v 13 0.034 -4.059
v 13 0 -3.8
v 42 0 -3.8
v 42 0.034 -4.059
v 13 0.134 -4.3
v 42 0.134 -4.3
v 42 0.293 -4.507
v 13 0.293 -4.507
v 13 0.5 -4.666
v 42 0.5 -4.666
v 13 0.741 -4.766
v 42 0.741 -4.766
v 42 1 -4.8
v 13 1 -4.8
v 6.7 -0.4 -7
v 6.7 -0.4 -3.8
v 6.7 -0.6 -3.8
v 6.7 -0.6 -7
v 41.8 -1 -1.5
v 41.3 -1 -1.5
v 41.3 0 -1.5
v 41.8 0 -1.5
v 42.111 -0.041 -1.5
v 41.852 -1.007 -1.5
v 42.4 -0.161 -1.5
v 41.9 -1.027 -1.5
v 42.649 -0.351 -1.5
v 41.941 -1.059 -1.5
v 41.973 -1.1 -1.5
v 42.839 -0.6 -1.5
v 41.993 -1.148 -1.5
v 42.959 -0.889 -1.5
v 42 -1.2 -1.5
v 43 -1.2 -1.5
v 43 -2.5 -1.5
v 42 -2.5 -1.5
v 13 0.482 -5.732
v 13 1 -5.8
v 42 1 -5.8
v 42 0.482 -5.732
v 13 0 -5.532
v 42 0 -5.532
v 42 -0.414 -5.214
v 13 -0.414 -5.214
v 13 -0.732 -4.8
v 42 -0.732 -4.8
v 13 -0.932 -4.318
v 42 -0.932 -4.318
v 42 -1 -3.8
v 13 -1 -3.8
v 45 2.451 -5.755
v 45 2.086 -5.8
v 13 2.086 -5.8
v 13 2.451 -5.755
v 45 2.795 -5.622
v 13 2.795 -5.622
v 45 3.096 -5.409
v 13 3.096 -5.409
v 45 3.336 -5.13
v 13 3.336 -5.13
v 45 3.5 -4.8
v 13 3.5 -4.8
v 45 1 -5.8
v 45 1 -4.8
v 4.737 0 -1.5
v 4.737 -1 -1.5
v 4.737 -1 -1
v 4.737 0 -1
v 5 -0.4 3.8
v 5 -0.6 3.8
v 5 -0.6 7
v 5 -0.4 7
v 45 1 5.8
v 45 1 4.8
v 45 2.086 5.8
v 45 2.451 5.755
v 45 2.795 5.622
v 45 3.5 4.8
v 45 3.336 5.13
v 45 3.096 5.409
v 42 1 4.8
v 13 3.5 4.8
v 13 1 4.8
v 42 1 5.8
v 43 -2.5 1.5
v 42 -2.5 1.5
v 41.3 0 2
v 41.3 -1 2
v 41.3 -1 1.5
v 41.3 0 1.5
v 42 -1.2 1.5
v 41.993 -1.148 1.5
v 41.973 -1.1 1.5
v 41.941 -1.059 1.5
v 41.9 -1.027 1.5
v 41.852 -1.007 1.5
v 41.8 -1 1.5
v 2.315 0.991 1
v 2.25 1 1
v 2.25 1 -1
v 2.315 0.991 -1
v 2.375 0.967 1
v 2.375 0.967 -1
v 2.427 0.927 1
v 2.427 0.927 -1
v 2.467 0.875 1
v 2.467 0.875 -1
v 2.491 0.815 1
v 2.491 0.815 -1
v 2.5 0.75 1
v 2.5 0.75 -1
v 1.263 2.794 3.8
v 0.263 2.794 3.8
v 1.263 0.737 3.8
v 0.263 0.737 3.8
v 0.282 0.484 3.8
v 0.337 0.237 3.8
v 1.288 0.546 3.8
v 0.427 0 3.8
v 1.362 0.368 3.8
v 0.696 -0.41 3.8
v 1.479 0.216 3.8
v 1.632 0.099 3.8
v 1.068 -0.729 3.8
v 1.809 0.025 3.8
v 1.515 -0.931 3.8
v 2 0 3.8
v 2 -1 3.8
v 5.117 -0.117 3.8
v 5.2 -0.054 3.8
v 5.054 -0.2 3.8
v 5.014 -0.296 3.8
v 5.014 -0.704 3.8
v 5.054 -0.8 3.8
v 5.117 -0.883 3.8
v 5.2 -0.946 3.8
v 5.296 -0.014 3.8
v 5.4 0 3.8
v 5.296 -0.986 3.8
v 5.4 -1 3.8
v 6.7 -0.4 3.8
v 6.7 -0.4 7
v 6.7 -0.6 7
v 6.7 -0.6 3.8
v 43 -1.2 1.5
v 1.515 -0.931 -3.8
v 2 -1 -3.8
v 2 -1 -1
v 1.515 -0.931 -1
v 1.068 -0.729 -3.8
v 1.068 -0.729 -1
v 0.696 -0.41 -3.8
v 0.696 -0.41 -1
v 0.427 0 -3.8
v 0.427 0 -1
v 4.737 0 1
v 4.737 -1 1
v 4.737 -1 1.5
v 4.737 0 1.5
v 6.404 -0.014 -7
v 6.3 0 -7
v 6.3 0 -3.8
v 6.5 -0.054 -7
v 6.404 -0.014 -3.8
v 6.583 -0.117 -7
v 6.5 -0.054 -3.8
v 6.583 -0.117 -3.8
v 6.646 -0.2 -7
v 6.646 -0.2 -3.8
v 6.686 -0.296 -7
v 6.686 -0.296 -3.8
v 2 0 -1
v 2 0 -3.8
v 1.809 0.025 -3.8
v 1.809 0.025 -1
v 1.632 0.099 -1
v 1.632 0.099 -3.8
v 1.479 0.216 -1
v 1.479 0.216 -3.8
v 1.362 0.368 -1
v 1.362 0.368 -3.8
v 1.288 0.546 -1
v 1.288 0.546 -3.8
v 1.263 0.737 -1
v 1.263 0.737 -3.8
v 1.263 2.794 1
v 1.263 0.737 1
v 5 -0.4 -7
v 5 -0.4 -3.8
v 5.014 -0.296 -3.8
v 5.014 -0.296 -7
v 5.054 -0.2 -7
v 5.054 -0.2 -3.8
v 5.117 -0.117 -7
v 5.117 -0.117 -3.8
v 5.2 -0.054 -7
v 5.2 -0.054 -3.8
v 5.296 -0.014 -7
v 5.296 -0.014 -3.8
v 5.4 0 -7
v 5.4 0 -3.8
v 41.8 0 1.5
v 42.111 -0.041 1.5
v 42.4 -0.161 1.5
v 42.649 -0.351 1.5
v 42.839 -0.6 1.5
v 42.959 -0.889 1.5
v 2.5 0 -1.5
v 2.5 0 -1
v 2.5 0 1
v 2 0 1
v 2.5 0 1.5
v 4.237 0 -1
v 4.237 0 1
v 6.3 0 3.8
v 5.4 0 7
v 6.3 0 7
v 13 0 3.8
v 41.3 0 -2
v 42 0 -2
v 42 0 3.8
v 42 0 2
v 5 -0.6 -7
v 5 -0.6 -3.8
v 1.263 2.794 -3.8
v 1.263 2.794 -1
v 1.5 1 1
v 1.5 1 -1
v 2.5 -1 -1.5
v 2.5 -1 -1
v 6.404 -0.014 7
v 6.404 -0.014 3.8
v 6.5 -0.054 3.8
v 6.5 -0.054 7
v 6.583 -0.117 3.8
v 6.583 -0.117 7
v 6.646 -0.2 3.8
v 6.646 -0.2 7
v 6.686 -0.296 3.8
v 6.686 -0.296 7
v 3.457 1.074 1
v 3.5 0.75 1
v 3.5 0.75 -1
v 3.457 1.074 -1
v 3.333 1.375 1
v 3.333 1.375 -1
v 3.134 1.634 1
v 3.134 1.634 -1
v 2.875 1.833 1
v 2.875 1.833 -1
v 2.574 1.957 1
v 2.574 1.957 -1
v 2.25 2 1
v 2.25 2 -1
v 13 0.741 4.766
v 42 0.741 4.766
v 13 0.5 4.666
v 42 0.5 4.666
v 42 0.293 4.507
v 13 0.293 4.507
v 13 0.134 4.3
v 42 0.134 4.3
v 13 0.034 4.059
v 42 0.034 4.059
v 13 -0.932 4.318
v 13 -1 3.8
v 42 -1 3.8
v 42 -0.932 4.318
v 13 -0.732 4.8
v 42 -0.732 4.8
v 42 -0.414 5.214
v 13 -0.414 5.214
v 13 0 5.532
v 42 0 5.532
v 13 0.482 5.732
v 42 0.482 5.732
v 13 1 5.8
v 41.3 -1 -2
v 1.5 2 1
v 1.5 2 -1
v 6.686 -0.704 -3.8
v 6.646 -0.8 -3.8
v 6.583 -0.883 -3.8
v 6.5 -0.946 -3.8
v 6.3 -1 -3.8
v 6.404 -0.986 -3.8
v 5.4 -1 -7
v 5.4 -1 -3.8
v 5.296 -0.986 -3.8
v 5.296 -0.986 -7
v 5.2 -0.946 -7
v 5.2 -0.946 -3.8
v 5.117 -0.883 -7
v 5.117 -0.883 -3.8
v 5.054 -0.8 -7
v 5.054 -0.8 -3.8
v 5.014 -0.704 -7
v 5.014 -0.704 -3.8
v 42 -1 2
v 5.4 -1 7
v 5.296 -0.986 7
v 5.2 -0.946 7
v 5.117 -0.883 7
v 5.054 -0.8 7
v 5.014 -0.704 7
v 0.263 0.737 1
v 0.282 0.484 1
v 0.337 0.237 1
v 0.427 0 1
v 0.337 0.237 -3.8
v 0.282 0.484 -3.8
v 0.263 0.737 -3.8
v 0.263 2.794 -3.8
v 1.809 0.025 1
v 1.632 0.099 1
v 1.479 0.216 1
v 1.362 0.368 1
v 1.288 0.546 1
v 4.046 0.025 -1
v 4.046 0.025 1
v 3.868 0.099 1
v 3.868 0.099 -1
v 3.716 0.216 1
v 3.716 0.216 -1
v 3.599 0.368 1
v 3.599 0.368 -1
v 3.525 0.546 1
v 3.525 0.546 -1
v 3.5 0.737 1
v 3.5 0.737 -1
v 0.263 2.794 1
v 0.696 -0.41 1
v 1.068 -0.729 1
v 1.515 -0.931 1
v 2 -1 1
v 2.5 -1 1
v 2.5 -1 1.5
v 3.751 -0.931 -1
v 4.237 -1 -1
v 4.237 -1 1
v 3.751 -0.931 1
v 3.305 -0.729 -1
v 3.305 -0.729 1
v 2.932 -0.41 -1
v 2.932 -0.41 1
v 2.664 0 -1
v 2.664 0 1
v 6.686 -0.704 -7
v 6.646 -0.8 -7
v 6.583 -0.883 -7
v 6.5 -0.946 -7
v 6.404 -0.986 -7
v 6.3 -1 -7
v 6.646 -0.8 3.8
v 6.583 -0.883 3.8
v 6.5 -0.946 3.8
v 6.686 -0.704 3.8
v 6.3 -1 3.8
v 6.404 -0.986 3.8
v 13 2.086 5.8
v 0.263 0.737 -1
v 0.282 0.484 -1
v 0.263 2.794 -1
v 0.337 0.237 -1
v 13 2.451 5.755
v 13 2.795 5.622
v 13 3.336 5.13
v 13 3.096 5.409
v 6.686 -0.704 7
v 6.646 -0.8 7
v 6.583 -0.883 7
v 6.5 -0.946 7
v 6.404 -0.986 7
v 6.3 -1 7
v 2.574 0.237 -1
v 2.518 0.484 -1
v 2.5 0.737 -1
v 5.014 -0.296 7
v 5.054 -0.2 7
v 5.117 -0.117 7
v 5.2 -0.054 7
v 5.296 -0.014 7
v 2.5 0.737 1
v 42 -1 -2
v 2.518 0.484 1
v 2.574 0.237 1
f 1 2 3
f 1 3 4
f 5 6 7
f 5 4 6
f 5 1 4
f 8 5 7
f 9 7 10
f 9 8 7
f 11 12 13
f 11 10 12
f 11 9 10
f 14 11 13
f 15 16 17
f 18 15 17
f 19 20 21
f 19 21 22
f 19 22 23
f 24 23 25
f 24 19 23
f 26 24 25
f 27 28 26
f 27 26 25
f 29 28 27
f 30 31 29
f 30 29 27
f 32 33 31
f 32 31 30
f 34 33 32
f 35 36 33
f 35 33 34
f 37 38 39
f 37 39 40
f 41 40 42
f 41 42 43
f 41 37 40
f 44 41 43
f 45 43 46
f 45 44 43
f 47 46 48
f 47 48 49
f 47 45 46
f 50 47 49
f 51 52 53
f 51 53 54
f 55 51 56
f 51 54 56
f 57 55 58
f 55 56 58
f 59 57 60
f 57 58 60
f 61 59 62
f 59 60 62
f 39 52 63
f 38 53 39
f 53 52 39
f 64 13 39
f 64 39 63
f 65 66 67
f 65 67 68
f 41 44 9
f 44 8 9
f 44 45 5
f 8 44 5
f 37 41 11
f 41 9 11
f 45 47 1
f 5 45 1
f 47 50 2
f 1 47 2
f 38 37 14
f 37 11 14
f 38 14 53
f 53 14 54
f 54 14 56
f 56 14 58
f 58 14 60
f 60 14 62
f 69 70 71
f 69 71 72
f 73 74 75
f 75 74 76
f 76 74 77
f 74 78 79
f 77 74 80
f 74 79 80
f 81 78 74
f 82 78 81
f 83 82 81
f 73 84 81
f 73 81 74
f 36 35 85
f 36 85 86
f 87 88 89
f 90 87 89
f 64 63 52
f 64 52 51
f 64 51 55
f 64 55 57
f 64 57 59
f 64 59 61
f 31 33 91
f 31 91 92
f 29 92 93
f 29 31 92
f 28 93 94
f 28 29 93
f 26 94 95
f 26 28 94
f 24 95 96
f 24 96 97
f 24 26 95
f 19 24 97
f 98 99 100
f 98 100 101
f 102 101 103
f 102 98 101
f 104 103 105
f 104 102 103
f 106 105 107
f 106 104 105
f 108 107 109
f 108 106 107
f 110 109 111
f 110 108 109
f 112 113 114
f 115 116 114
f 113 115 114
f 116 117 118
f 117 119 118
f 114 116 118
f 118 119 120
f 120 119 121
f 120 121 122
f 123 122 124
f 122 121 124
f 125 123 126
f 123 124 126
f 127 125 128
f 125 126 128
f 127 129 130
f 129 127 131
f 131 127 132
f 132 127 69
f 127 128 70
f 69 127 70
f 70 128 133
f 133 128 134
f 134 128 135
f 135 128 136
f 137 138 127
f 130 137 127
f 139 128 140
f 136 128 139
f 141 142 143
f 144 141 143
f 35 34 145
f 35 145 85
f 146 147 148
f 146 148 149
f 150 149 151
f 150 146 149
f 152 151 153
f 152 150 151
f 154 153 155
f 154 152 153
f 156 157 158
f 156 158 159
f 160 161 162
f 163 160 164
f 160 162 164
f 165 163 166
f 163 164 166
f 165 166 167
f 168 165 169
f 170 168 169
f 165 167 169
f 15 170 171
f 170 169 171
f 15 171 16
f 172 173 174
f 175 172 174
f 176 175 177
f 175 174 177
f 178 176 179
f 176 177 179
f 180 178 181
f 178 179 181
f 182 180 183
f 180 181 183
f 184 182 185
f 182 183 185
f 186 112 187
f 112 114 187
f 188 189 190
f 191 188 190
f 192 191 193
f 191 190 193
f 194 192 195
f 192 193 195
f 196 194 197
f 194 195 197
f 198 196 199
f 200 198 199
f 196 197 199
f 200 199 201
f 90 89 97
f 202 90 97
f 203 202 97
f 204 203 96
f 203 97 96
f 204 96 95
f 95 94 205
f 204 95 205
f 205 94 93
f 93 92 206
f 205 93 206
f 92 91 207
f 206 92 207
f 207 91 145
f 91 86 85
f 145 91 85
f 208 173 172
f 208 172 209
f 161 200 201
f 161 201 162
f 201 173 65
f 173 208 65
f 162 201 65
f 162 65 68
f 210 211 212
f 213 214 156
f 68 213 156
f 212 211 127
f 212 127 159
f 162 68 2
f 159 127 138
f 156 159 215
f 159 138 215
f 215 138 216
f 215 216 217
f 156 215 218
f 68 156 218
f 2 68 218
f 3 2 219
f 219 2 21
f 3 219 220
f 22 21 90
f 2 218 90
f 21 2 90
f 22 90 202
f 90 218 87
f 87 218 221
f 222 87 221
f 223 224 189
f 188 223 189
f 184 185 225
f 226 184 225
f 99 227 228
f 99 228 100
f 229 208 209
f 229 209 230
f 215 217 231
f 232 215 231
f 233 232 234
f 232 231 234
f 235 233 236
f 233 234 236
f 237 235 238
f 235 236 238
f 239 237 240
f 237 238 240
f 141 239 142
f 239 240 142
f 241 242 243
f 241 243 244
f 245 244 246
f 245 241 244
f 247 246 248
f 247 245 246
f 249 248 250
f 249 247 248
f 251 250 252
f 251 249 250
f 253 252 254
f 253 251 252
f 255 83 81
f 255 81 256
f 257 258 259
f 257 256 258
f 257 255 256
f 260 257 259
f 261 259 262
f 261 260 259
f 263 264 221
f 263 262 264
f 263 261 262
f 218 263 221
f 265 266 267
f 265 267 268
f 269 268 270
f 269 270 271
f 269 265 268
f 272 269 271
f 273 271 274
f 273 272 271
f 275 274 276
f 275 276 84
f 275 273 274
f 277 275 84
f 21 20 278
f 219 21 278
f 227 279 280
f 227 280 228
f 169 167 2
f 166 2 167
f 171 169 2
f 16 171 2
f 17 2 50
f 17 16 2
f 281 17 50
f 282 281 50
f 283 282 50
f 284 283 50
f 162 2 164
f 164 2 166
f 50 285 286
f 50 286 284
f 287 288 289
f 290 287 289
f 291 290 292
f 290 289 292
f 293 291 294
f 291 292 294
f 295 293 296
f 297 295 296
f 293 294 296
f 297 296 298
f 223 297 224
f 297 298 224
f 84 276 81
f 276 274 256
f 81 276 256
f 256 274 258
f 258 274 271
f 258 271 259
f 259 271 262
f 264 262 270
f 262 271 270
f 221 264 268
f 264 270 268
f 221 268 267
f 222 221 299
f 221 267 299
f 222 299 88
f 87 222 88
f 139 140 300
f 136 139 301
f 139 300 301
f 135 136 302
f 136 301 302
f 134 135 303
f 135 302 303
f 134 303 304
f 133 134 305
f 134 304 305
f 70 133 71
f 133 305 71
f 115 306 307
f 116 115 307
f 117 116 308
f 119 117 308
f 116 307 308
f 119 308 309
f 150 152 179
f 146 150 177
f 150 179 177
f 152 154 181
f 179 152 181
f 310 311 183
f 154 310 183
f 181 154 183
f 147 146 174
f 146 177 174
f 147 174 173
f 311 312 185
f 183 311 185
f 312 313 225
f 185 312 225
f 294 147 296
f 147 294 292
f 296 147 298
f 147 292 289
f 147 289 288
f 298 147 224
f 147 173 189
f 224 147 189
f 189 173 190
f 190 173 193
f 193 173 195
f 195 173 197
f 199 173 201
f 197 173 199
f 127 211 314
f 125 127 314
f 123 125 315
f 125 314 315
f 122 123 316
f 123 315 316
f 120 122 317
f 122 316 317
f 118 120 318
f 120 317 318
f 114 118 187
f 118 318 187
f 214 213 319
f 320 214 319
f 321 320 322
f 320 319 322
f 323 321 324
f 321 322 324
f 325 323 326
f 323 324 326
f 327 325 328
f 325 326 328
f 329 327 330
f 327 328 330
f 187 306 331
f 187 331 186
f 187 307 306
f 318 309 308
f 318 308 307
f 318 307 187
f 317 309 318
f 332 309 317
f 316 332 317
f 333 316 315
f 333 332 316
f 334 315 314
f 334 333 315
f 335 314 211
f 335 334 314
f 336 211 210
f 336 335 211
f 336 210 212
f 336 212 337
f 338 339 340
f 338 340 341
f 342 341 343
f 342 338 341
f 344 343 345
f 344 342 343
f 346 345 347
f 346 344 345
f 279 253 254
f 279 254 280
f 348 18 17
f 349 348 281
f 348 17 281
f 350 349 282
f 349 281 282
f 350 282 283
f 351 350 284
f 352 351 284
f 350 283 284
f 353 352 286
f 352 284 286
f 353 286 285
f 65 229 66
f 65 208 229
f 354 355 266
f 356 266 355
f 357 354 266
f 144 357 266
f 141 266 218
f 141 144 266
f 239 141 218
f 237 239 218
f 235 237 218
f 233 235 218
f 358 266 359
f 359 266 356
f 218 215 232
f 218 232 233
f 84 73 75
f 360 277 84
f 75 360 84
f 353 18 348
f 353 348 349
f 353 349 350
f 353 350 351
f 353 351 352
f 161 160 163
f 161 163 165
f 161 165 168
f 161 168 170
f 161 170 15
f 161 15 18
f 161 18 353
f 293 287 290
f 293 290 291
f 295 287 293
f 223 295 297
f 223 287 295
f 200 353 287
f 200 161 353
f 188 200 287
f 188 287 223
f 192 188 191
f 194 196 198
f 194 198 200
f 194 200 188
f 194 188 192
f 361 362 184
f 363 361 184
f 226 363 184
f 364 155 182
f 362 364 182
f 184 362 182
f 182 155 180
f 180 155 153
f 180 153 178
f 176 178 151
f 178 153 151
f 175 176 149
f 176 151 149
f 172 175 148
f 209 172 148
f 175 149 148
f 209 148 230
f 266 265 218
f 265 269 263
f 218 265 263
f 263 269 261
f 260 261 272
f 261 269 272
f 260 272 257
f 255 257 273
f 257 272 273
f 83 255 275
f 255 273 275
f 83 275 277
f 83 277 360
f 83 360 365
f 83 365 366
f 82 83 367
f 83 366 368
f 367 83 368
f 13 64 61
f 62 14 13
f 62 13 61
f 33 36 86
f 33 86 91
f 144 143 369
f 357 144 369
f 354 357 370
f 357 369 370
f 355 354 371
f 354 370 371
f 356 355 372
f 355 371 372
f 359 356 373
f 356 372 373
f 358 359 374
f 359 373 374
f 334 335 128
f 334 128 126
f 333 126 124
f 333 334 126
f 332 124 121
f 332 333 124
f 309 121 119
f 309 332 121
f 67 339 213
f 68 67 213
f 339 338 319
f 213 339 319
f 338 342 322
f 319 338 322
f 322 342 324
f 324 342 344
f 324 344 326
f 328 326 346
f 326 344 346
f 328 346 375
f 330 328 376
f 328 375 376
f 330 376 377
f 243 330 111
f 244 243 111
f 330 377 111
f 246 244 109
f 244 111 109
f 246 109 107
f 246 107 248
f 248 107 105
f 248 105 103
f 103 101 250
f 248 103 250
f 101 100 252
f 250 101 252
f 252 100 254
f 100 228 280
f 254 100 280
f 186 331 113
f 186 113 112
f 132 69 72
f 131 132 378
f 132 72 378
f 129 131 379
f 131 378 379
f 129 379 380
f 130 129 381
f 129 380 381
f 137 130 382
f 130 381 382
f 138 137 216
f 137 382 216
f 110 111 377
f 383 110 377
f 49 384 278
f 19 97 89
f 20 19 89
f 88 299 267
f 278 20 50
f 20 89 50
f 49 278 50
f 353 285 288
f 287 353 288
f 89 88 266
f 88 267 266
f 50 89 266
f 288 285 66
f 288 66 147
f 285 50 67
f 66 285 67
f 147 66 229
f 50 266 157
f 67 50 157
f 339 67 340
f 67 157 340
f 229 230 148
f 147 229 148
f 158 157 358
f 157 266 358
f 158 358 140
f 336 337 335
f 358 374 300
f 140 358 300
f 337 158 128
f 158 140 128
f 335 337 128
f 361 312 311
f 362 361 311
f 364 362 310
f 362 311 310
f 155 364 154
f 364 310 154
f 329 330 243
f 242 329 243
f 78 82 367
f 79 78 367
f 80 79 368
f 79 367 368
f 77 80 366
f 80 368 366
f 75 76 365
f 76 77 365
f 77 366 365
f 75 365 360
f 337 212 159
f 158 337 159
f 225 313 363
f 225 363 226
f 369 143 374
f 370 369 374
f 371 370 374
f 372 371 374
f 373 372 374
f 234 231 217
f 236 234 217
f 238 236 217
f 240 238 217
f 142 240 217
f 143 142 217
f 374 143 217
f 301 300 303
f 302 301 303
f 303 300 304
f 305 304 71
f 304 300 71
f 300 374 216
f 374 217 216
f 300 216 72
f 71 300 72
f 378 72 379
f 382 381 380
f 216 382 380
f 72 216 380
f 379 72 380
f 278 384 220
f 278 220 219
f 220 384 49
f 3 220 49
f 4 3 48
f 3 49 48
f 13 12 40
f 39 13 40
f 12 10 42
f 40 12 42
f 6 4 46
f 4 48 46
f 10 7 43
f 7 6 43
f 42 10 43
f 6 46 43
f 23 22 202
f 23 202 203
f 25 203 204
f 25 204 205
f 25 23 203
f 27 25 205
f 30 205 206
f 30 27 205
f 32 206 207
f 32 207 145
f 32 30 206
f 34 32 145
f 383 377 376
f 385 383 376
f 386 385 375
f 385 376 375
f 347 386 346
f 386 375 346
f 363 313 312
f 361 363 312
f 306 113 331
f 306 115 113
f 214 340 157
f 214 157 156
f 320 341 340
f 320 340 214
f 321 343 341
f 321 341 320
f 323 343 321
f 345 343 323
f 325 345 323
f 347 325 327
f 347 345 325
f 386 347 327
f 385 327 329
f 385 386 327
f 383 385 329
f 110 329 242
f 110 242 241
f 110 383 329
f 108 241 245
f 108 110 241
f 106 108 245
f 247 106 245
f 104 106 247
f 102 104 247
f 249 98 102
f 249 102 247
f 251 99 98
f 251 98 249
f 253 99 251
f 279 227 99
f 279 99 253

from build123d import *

# Parameters (mm, degrees)
BASE_FLANGE2_DEPTH              = 45
FRONT_CUT_DEPTH                 = 2
FRONT_STRIP_W                   = 4.4
FRONT_STRIP_H                   = 1
FRONT_STRIP_CUT_DEPTH           = 3
FRONT_RELIEF_W                  = 4.9
FRONT_RELIEF_H                  = 0.5
FRONT_RELIEF_CUT_DEPTH          = 1
FRONT_DEPTH                     = 3
BACK_CUT_DEPTH                  = 13
GUIDING_PINS_DEPTH              = 7
FILLET3_R                       = 1.5
BACK_START                      = -3.8
BACK_2_BENDS_DEPTH              = 7.6
BACK_2_BENDS_2_DEPTH            = 7.6
MIDDLE_CUT_DEPTH                = 46.675485766
MIDDLE_CUT_DEPTH_BACK           = 46.675485766
SKETCH32_W                      = 2.5
SKETCH32_H                      = 2
MIDDLE_START                    = -1.5
MIDDLE_SPRING_1_DEPTH           = 3
MIDDLE_SPRING_1_2_DEPTH         = 0.5
MIDDLE_START_2                  = 1
MIDDLE_SPRING_1_3_DEPTH         = 0.5
MIDDLE_START_3                  = -1
MIDDLE_SPRING_1_4_DEPTH         = 2
MIDDLE_SPRING_2_STRIP_W         = 4.5
MIDDLE_SPRING_2_STRIP_H         = 1
MIDDLE_SPRING_2_STRIP_CUT_DEPTH = 2
MIDDLE_SPRING_2_DEPTH           = 2
SKETCH50_W                      = 1
SKETCH50_H                      = 2.8
BACK_2_BENDS_EXTENSION_DEPTH    = 2


# Read off the part's stored shape, not the designer's step: back cut, back 2 bends, middle spring 1
# Sheet-metal steps are written as plain solids
with BuildPart() as part:
    # Sketch6 → Base-Flange2 (new body)
    with BuildSketch(Plane(origin=(0, 0, 0), x_dir=(0, 0, -1), z_dir=(1, 0, 0))):
        with BuildLine():
            Line((-4.8, 3.5), (-4.8, 1))
            ThreePointArc((-4.8, 1), (-4.507106781, 0.292893219), (-3.8, 0))
            Line((-3.8, 0), (3.8, 0))
            ThreePointArc((3.8, 0), (4.507106781, 0.292893219), (4.8, 1))
            Line((4.8, 1), (4.8, 3.5))
            Line((4.8, 3.5), (5.8, 3.5))
            Line((5.8, 3.5), (5.8, 1))
            ThreePointArc((5.8, 1), (5.214213562, -0.414213562), (3.8, -1))
            Line((3.8, -1), (-3.8, -1))
            ThreePointArc((-3.8, -1), (-5.214213562, -0.414213562), (-5.8, 1))
            Line((-5.8, 1), (-5.8, 3.5))
            Line((-5.8, 3.5), (-4.8, 3.5))
        make_face()
    extrude(amount=BASE_FLANGE2_DEPTH)

    # Sketch51 → front cut (cut)
    with BuildSketch(Plane.XZ.offset(1)):
        Polygon((42, 1.5), (43, 1.5), (43, -1.5), (42, -1.5), (42, -6), (46, -6), (46, -1.5), (45, -1.5), (45, 1.5), (46, 1.5), (46, 6), (42, 6), align=None)
    extrude(amount=-FRONT_CUT_DEPTH, mode=Mode.SUBTRACT)

    # front strip (across the edge) → front strip cut (cut)
    with BuildSketch(Plane(origin=(43, -1, -1.5), x_dir=(-1, 0, 0), z_dir=(0, 0, 1))):
        with Locations((-1, -0.5)):
            Rectangle(FRONT_STRIP_W, FRONT_STRIP_H)
    extrude(amount=FRONT_STRIP_CUT_DEPTH, mode=Mode.SUBTRACT)

    # front relief (on the sheet) → front relief cut (cut)
    with BuildSketch(Plane(origin=(41.8, -1, -1.5), x_dir=(-1, 0, 0), z_dir=(0, -1, 0))):
        with Locations((-1.95, 0.25)):
            Rectangle(FRONT_RELIEF_W, FRONT_RELIEF_H)
        with Locations((-1.95, -3.25)):
            Rectangle(FRONT_RELIEF_W, FRONT_RELIEF_H)
    extrude(amount=-FRONT_RELIEF_CUT_DEPTH, mode=Mode.SUBTRACT)

    # front section (across the edge) → front (add)
    with BuildSketch(Plane(origin=(43, -1, -1.5), x_dir=(-1, 0, 0), z_dir=(0, 0, 1))):
        with BuildLine():
            Line((0, 0.2), (0, 1.5))
            Line((0, 1.5), (1, 1.5))
            Line((1, 1.5), (1, 0.2))
            ThreePointArc((1, 0.2), (1.058578644, 0.058578644), (1.2, 0))
            Line((1.2, 0), (1.2, -1))
            ThreePointArc((1.2, -1), (0.351471863, -0.648528137), (0, 0.2))
        make_face()
    extrude(amount=FRONT_DEPTH)

    # back cut outline → back cut (cut)
    with BuildSketch(Plane.YZ):
        with BuildLine():
            Line((-1, 3.8), (0, 3.8))
            ThreePointArc((0, 3.8), (0.292893219, 4.507106781), (1, 4.8))
            Line((1, 4.8), (3.5, 4.8))
            Line((3.5, 4.8), (3.5, 5.8))
            Line((3.5, 5.8), (1, 5.8))
            ThreePointArc((1, 5.8), (-0.414213562, 5.214213562), (-1, 3.8))
        make_face()
        with BuildLine():
            ThreePointArc((1, -4.8), (0.292893219, -4.507106781), (0, -3.8))
            Line((0, -3.8), (-1, -3.8))
            ThreePointArc((-1, -3.8), (-0.414213562, -5.214213562), (1, -5.8))
            Line((1, -5.8), (3.5, -5.8))
            Line((3.5, -5.8), (3.5, -4.8))
            Line((3.5, -4.8), (1, -4.8))
        make_face()
    extrude(amount=BACK_CUT_DEPTH, mode=Mode.SUBTRACT)

    # Sketch27 → guiding pins (add, symmetric)
    with BuildSketch(Plane.XY):
        with BuildLine():
            Line((5.4, 0), (6.3, 0))
            ThreePointArc((6.3, 0), (6.582842712, -0.117157288), (6.7, -0.4))
            Line((6.7, -0.4), (6.7, -0.6))
            ThreePointArc((6.7, -0.6), (6.582842712, -0.882842712), (6.3, -1))
            Line((6.3, -1), (5.4, -1))
            ThreePointArc((5.4, -1), (5.117157288, -0.882842712), (5, -0.6))
            Line((5, -0.6), (5, -0.4))
            ThreePointArc((5, -0.4), (5.117157288, -0.117157288), (5.4, 0))
        make_face()
    extrude(amount=GUIDING_PINS_DEPTH, both=True)

    # Fillet3
    # the kernel refuses this fillet: 1.5 mm, written as the material it takes off along each edge
    with BuildSketch(Plane(origin=(9.464466094, 3.5, 5.8), x_dir=(0, -1, 0), z_dir=(1, 0, 0))) as fillet3_piece_1:
        with BuildLine():
            CenterArc((1.414213562, 1.5), FILLET3_R, 199.471220634, 70.528779366)
            Line((0, 1), (-0.028284271, 0.99))
            ThreePointArc((-0.028284271, 0.99), (-0.03, 0.5), (-0.03, 0))
            Line((-0.03, 0), (0, -0.03))
            Line((0, -0.03), (1.414213562, -0.03))
            Line((1.414213562, -0.03), (1.414213562, 0))
        make_face()
    extrude(amount=39.071067812, mode=Mode.SUBTRACT)
    with BuildSketch(Plane(origin=(9.464466094, 3.5, -5.8), x_dir=(0, -1, 0), z_dir=(1, 0, 0))) as fillet3_piece_2:
        with BuildLine():
            CenterArc((1.414213562, -1.5), FILLET3_R, 90, 70.528779366)
            Line((0, -1), (-0.028284271, -0.99))
            ThreePointArc((-0.028284271, -0.99), (-0.03, -0.5), (-0.03, 0))
            Line((-0.03, 0), (0, 0.03))
            Line((0, 0.03), (1.414213562, 0.03))
            Line((1.414213562, 0.03), (1.414213562, 0))
        make_face()
    extrude(amount=39.071067812, mode=Mode.SUBTRACT)

    # back 2 bends outline → back 2 bends (cut)
    with BuildSketch(Plane.XY.offset(BACK_START)):
        with BuildLine():
            Line((0, -1), (2, -1))
            ThreePointArc((2, -1), (1.068173836, -0.728828115), (0.42735891, 0))
            Line((0.42735891, 0), (0, 0))
            Line((0, 0), (0, -1))
        make_face()
    extrude(amount=BACK_2_BENDS_DEPTH, mode=Mode.SUBTRACT)

    # back 2 bends 2 outline → back 2 bends 2 (add)
    with BuildSketch(Plane.XY.offset(BACK_START)):
        with BuildLine():
            ThreePointArc((0.2634, 0.7366), (0.304885243, 0.359286442), (0.42735891, 0))
            Line((0.42735891, 0), (2, 0))
            ThreePointArc((2, 0), (1.479145145, 0.215745145), (1.2634, 0.7366))
            Line((1.2634, 0.7366), (1.2634, 0.794153262))
            Line((1.2634, 0.794153262), (0.2634, 0.794153262))
            Line((0.2634, 0.794153262), (0.2634, 0.7366))
        make_face()
    extrude(amount=BACK_2_BENDS_2_DEPTH)

    # Sketch32 → middle cut (cut, two sides: drawn at the far end of the back side and taken through both)
    with BuildSketch(Plane(origin=(0, 0, 0), x_dir=(1, 0, 0), z_dir=(0, 1, 0)).offset(-MIDDLE_CUT_DEPTH_BACK)):
        with Locations((1.25, 0)):
            Rectangle(SKETCH32_W, SKETCH32_H)
    extrude(amount=MIDDLE_CUT_DEPTH + MIDDLE_CUT_DEPTH_BACK, mode=Mode.SUBTRACT)

    # middle spring 1 outline → middle spring 1 (cut)
    with BuildSketch(Plane.XY.offset(MIDDLE_START)):
        with BuildLine():
            Line((2.5, 0), (2.5, -1))
            Line((2.5, -1), (4.2366, -1))
            ThreePointArc((4.2366, -1), (3.304773836, -0.728828115), (2.66395891, 0))
            Line((2.66395891, 0), (2.5, 0))
        make_face()
    extrude(amount=MIDDLE_SPRING_1_DEPTH, mode=Mode.SUBTRACT)

    # middle spring 1 2 outline → middle spring 1 2 (cut)
    with BuildSketch(Plane.XY.offset(MIDDLE_START)):
        with BuildLine():
            ThreePointArc((2.66395891, 0), (3.304773836, -0.728828115), (4.2366, -1))
            Line((4.2366, -1), (4.7366, -1))
            Line((4.7366, -1), (4.7366, 0))
            Line((4.7366, 0), (2.66395891, 0))
        make_face()
    extrude(amount=MIDDLE_SPRING_1_2_DEPTH, mode=Mode.SUBTRACT)

    # middle spring 1 3 outline → middle spring 1 3 (cut)
    with BuildSketch(Plane.XY.offset(MIDDLE_START_2)):
        with BuildLine():
            ThreePointArc((2.66395891, 0), (3.304773836, -0.728828115), (4.2366, -1))
            Line((4.2366, -1), (4.7366, -1))
            Line((4.7366, -1), (4.7366, 0))
            Line((4.7366, 0), (2.66395891, 0))
        make_face()
    extrude(amount=MIDDLE_SPRING_1_3_DEPTH, mode=Mode.SUBTRACT)

    # middle spring 1 4 outline → middle spring 1 4 (add)
    with BuildSketch(Plane.XY.offset(MIDDLE_START_3)):
        with BuildLine():
            ThreePointArc((2.5, 0.7366), (2.541485243, 0.359286442), (2.66395891, 0))
            Line((2.66395891, 0), (4.2366, 0))
            ThreePointArc((4.2366, 0), (3.715745145, 0.215745145), (3.5, 0.7366))
            Line((3.5, 0.7366), (3.5, 2))
            Line((3.5, 2), (2.5, 2))
            Line((2.5, 2), (2.5, 0.7366))
        make_face()
    extrude(amount=MIDDLE_SPRING_1_4_DEPTH)

    # middle spring 2 strip (across the edge) → middle spring 2 strip cut (cut)
    with BuildSketch(Plane(origin=(2.5, 2, 1), x_dir=(0, -1, 0), z_dir=(0, 0, -1))):
        with Locations((-1, -0.5)):
            Rectangle(MIDDLE_SPRING_2_STRIP_W, MIDDLE_SPRING_2_STRIP_H)
    extrude(amount=MIDDLE_SPRING_2_STRIP_CUT_DEPTH, mode=Mode.SUBTRACT)

    # middle spring 2 section (across the edge) → middle spring 2 (add)
    with BuildSketch(Plane(origin=(2.5, 2, 1), x_dir=(0, -1, 0), z_dir=(0, 0, -1))):
        with BuildLine():
            Line((0, 0.25), (0, 1))
            Line((0, 1), (1, 1))
            Line((1, 1), (1, 0.25))
            ThreePointArc((1, 0.25), (1.073223305, 0.073223305), (1.25, 0))
            Line((1.25, 0), (1.25, -1))
            ThreePointArc((1.25, -1), (0.366116524, -0.633883476), (0, 0.25))
        make_face()
    extrude(amount=MIDDLE_SPRING_2_DEPTH)

    # Sketch50 → back 2 bends extension (add)
    with BuildSketch(Plane(origin=(0, 0.794153262, 0), x_dir=(1, 0, 0), z_dir=(0, 1, 0))):
        with Locations((0.7634, -2.4)):
            Rectangle(SKETCH50_W, SKETCH50_H)
        with Locations((0.7634, 2.4)):
            Rectangle(SKETCH50_W, SKETCH50_H)
    extrude(amount=BACK_2_BENDS_EXTENSION_DEPTH)


solid = part.part
